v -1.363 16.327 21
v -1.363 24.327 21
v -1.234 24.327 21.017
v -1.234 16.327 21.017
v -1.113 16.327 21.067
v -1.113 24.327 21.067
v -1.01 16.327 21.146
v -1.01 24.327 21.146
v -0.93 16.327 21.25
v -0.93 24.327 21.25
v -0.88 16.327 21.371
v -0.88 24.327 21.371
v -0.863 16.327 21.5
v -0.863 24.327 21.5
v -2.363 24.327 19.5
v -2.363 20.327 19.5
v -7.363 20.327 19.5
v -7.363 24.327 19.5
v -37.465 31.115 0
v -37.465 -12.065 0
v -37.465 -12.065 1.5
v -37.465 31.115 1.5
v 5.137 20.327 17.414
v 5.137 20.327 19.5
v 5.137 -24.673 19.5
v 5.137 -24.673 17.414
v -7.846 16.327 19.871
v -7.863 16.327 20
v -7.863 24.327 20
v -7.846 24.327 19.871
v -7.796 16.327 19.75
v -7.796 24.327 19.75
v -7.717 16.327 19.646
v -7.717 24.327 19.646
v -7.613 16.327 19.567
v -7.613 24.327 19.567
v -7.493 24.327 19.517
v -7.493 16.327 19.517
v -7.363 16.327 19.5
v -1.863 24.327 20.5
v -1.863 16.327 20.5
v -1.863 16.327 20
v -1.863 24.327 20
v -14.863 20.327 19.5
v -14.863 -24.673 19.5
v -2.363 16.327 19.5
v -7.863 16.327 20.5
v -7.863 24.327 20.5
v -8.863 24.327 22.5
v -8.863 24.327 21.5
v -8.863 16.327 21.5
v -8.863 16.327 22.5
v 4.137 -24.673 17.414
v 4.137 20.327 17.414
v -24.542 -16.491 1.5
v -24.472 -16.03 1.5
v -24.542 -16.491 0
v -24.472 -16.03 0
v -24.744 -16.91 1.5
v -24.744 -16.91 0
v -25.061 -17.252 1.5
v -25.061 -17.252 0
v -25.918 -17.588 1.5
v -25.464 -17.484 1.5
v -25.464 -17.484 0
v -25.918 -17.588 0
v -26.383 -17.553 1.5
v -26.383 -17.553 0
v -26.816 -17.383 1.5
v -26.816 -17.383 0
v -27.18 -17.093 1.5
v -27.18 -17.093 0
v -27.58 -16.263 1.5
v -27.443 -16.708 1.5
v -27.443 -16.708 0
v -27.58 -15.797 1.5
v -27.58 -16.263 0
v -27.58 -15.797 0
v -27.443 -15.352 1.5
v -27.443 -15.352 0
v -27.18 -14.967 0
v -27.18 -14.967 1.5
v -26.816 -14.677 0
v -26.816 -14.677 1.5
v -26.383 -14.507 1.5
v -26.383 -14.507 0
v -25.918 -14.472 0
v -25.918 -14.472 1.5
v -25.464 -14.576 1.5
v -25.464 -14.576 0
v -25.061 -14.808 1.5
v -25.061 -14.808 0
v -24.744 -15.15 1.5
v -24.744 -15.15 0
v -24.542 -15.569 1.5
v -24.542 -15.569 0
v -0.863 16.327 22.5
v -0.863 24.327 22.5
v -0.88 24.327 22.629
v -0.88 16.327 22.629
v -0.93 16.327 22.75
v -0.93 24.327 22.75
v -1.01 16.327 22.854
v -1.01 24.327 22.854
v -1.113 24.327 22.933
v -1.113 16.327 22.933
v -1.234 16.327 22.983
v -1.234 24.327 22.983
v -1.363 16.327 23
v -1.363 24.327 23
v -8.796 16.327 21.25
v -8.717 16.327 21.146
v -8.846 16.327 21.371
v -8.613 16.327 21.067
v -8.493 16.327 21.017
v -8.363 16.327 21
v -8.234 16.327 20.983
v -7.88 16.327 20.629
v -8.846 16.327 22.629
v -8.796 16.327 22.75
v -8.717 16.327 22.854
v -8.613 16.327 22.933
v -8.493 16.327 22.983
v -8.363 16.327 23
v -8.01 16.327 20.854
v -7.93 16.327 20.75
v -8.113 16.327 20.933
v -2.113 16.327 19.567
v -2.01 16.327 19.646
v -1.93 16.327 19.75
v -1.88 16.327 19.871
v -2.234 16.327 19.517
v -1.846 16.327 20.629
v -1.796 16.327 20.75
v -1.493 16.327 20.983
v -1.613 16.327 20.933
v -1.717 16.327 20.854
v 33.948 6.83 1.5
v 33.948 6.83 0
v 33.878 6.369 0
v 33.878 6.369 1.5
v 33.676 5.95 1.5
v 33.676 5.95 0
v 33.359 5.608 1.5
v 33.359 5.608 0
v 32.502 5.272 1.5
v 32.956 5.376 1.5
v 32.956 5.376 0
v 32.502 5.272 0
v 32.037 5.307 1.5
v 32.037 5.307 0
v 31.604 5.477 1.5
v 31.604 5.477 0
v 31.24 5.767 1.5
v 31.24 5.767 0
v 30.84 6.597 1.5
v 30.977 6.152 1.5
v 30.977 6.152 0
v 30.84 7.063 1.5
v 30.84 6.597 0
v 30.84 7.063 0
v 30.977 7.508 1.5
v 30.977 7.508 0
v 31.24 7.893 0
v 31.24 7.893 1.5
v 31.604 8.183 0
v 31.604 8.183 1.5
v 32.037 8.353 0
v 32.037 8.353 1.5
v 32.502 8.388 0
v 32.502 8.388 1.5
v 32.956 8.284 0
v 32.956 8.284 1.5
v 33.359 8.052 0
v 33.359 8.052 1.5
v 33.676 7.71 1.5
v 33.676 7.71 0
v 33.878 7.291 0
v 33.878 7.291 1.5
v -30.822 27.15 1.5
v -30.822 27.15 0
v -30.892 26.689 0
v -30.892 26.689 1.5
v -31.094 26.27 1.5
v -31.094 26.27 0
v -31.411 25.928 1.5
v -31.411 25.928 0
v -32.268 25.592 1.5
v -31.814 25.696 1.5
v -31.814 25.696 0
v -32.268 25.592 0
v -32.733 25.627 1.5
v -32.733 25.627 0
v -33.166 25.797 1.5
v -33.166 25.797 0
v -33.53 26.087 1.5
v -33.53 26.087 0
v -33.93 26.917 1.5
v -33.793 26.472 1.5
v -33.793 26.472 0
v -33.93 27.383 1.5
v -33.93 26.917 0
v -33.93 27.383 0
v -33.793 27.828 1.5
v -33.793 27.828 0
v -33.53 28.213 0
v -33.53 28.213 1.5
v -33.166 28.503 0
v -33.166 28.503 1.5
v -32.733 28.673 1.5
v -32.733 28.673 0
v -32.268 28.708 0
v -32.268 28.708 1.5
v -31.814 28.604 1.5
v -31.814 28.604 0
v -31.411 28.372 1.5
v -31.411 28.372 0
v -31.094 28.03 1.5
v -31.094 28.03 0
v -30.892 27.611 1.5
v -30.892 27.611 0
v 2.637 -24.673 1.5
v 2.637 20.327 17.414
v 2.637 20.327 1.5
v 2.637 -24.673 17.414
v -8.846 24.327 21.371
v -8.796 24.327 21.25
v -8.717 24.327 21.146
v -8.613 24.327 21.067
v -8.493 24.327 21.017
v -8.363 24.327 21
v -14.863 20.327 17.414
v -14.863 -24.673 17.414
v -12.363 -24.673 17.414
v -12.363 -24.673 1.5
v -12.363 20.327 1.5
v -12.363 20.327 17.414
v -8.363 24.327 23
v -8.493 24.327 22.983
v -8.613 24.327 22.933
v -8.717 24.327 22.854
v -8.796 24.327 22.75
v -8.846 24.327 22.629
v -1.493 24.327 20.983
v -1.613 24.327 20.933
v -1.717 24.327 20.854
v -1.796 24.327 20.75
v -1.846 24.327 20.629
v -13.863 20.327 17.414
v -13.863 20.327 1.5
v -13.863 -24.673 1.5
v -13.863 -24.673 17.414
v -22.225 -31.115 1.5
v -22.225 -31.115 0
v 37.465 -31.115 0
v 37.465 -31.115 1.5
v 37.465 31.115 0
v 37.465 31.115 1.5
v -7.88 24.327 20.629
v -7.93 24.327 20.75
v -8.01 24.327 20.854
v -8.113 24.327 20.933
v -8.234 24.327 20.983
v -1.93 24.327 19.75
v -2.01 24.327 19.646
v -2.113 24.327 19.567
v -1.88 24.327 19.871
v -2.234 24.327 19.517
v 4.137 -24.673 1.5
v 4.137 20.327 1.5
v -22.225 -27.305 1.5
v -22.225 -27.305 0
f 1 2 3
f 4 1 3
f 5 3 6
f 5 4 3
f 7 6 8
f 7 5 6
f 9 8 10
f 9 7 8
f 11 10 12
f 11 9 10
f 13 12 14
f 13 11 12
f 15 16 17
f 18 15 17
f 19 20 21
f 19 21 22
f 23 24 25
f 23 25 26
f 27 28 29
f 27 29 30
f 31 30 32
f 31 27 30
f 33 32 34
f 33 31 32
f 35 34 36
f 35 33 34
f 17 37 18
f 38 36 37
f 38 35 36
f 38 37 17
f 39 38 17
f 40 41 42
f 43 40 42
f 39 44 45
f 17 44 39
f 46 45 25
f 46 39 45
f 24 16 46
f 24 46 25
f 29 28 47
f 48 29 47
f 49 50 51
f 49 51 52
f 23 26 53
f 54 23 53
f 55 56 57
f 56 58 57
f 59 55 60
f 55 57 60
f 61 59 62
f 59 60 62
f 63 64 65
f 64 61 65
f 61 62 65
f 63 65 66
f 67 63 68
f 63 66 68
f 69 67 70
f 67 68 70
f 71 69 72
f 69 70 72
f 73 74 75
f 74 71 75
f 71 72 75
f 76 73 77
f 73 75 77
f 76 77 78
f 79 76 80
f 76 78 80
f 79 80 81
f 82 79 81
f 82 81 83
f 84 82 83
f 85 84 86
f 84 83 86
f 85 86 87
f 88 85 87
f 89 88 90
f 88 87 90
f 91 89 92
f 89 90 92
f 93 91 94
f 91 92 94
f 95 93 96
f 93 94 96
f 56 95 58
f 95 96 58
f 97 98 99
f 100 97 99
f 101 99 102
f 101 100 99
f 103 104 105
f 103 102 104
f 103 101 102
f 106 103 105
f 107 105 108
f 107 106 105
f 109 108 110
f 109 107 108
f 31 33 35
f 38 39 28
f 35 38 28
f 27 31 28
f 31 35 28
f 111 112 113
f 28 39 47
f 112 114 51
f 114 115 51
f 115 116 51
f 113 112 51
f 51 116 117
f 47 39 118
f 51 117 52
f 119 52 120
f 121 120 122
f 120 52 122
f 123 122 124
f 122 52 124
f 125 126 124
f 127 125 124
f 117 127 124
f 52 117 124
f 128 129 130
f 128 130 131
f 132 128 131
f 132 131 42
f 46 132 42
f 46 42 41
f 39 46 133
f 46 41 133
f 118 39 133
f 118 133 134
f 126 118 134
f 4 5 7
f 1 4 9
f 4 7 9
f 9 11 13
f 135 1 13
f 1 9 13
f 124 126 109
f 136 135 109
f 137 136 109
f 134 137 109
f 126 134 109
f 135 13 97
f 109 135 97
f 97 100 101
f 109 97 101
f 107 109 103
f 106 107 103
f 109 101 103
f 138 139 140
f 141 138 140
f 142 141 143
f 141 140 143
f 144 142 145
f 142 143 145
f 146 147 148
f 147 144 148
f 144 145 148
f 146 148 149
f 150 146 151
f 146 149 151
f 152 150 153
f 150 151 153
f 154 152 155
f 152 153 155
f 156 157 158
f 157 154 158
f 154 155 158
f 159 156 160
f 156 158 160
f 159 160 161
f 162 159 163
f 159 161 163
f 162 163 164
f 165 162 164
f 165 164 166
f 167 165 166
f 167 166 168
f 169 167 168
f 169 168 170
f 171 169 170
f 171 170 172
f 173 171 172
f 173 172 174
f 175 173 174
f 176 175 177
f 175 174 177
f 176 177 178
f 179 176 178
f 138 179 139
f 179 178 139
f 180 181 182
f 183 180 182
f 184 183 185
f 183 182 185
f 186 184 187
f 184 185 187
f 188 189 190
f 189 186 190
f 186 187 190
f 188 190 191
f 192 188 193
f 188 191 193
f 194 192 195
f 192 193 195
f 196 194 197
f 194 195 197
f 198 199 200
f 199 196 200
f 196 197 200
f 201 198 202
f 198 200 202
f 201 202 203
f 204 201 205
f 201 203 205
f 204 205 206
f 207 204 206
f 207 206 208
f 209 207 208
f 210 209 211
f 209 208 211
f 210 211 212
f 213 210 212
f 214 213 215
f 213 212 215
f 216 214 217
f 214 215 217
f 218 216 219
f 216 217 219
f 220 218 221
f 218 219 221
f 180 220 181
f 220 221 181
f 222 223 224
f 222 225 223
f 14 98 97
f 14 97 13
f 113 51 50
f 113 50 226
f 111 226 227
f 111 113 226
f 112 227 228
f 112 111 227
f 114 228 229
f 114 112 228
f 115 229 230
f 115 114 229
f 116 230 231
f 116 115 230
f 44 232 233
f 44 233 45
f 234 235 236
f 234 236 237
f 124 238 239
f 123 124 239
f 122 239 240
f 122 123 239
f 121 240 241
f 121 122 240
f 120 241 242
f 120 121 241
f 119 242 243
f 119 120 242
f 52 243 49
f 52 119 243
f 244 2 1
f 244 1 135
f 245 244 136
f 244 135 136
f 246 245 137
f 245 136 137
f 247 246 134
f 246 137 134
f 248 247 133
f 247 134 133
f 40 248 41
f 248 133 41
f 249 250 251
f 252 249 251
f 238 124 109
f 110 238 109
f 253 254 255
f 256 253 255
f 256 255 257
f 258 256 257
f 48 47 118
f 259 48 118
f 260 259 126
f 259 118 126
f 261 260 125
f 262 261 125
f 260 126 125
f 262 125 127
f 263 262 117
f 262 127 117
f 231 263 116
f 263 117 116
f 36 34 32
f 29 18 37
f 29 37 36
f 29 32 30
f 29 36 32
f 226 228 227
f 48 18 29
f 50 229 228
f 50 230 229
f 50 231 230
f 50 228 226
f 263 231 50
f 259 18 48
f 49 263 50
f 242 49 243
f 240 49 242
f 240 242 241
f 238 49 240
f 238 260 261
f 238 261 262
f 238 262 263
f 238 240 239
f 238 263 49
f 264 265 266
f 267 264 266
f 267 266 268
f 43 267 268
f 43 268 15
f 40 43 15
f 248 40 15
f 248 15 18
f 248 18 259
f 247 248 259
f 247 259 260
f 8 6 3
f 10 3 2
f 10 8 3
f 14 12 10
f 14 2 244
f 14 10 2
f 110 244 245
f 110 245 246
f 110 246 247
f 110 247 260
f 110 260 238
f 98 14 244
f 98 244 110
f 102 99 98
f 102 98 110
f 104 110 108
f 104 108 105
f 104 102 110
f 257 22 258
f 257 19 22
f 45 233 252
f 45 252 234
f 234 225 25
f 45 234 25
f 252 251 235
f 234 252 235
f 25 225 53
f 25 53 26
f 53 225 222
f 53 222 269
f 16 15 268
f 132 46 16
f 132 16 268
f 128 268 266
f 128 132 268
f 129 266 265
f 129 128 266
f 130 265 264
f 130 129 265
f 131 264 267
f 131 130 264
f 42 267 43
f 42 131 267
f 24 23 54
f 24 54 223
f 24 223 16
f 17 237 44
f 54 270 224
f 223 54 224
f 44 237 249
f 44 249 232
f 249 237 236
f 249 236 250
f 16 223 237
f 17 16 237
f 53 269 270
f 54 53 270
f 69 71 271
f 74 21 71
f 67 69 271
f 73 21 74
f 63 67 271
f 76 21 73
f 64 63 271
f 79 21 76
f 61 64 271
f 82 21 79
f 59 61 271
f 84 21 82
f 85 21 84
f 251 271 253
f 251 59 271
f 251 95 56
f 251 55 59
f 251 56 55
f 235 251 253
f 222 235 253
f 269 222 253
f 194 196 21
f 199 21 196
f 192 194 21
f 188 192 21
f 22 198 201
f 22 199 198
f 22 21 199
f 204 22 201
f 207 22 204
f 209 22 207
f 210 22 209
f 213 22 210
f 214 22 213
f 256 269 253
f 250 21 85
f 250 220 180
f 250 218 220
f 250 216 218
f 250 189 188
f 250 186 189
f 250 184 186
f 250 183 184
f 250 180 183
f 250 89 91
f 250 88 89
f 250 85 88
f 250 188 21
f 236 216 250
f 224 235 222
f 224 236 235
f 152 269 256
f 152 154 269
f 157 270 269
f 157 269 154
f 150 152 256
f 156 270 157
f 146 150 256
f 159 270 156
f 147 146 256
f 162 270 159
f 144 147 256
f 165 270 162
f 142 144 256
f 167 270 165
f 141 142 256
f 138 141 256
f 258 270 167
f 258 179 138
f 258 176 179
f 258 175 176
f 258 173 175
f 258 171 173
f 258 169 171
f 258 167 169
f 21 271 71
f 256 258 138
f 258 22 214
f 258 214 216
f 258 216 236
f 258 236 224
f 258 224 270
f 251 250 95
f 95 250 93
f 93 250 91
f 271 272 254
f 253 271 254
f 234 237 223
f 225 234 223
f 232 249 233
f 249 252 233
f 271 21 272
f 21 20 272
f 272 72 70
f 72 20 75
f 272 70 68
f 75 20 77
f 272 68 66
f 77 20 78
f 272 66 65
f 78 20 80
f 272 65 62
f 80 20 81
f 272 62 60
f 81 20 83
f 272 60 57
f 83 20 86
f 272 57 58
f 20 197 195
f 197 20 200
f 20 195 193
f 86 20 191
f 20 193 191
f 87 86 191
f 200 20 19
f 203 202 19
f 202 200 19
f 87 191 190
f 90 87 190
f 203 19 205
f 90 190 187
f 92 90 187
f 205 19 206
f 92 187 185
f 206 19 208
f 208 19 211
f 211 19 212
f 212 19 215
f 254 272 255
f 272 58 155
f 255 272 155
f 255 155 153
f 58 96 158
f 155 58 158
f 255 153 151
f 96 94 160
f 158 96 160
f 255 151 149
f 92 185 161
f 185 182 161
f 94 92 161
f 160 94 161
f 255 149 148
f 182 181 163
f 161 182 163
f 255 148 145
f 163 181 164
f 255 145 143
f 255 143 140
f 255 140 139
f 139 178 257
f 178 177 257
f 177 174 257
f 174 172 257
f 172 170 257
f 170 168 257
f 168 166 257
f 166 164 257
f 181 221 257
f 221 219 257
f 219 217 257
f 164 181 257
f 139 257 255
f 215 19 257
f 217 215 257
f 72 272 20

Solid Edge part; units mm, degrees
sketch "Sketch1" plane through (0, 0, 0) normal (0, 0, 1) x (1, 0, 0)
  line L0 (-22.225, -31.115) -> (37.465, -31.115)
  line L1 (37.465, -31.115) -> (37.465, 31.115)
  line L2 (-37.465, 31.115) -> (37.465, 31.115)
  line L3 (-37.465, -12.065) -> (-37.465, 31.115)
  line L4 (-37.465, -12.065) -> (-22.225, -27.305)
  line L5 (-22.225, -27.305) -> (-22.225, -31.115)
  circle A0 centre (-26.035, -16.03) radius 1.5625
  circle A1 centre (-32.385, 27.15) radius 1.5625
  circle A2 centre (32.385, 6.83) radius 1.5625
extrude "Protrusion1" add sketch "Sketch1" along normal blind 1.5
sketch "Sketch2" plane through (0, 0, 1.5) normal (0, 0, 1) x (1, 0, 0)
  line L0 (4.1366, -24.673) -> (4.1366, 20.327)
  line L1 (4.1366, 20.327) -> (-13.8634, 20.327)
  line L2 (-13.8634, 20.327) -> (-13.8634, -24.673)
  line L3 (-13.8634, -24.673) -> (4.1366, -24.673)
extrude "ExtrudedProtrusion_2" add sketch "Sketch2" along normal blind 18
sketch "Sketch3" plane through (-4.8634, -24.673, 10.5) normal (0, -1, 0) x (1, 0, 0)
  line L0 (-7.5, -9) -> (-7.5, 6.914)
  line L1 (-7.5, 6.914) -> (7.5, 6.914)
  line L2 (7.5, 6.914) -> (7.5, -9)
  line L3 (7.5, -9) -> (-7.5, -9)
extrude "ExtrudedCutout_1" cut sketch "Sketch3" against normal blind 56
sketch "Sketch4" plane through (-4.8634, -24.673, 10.5) normal (0, -1, 0) x (1, 0, 0)
  line L0 (10, 6.914) -> (-10, 6.914)
  line L1 (-10, 6.914) -> (-10, 9)
  line L2 (-10, 9) -> (10, 9)
  line L3 (10, 9) -> (10, 6.914)
extrude "ExtrudedProtrusion_3" add sketch "Sketch4" against normal blind 45
sketch "Sketch5" plane through (-4.8634, 20.327, 10.5) normal (0, 1, 0) x (-1, 0, 0)
  line L0 (3.5, 12.5) -> (-3.5, 12.5)
  arc A0 (-3.5, 12.5) -> (-4, 12) centre (-3.5, 12) ccw
  line L1 (-4, 12) -> (-4, 11)
  arc A1 (-4, 11) -> (-3.5, 10.5) centre (-3.5, 11) ccw
  arc A2 (-3.5, 10.5) -> (-3, 10) centre (-3.5, 10) cw
  line L2 (-3, 10) -> (-3, 9.5)
  arc A3 (-3, 9.5) -> (-2.5, 9) centre (-2.5, 9.5) ccw
  line L3 (-2.5, 9) -> (2.5, 9)
  arc A4 (2.5, 9) -> (3, 9.5) centre (2.5, 9.5) ccw
  line L4 (3, 9.5) -> (3, 10)
  arc A5 (3, 10) -> (3.5, 10.5) centre (3.5, 10) cw
  arc A6 (4, 11) -> (3.5, 10.5) centre (3.5, 11) cw
  line L5 (4, 11) -> (4, 12)
  arc A7 (3.5, 12.5) -> (4, 12) centre (3.5, 12) cw
extrude "ExtrudedProtrusion_4" add sketch "Sketch5" along normal mid plane 8
